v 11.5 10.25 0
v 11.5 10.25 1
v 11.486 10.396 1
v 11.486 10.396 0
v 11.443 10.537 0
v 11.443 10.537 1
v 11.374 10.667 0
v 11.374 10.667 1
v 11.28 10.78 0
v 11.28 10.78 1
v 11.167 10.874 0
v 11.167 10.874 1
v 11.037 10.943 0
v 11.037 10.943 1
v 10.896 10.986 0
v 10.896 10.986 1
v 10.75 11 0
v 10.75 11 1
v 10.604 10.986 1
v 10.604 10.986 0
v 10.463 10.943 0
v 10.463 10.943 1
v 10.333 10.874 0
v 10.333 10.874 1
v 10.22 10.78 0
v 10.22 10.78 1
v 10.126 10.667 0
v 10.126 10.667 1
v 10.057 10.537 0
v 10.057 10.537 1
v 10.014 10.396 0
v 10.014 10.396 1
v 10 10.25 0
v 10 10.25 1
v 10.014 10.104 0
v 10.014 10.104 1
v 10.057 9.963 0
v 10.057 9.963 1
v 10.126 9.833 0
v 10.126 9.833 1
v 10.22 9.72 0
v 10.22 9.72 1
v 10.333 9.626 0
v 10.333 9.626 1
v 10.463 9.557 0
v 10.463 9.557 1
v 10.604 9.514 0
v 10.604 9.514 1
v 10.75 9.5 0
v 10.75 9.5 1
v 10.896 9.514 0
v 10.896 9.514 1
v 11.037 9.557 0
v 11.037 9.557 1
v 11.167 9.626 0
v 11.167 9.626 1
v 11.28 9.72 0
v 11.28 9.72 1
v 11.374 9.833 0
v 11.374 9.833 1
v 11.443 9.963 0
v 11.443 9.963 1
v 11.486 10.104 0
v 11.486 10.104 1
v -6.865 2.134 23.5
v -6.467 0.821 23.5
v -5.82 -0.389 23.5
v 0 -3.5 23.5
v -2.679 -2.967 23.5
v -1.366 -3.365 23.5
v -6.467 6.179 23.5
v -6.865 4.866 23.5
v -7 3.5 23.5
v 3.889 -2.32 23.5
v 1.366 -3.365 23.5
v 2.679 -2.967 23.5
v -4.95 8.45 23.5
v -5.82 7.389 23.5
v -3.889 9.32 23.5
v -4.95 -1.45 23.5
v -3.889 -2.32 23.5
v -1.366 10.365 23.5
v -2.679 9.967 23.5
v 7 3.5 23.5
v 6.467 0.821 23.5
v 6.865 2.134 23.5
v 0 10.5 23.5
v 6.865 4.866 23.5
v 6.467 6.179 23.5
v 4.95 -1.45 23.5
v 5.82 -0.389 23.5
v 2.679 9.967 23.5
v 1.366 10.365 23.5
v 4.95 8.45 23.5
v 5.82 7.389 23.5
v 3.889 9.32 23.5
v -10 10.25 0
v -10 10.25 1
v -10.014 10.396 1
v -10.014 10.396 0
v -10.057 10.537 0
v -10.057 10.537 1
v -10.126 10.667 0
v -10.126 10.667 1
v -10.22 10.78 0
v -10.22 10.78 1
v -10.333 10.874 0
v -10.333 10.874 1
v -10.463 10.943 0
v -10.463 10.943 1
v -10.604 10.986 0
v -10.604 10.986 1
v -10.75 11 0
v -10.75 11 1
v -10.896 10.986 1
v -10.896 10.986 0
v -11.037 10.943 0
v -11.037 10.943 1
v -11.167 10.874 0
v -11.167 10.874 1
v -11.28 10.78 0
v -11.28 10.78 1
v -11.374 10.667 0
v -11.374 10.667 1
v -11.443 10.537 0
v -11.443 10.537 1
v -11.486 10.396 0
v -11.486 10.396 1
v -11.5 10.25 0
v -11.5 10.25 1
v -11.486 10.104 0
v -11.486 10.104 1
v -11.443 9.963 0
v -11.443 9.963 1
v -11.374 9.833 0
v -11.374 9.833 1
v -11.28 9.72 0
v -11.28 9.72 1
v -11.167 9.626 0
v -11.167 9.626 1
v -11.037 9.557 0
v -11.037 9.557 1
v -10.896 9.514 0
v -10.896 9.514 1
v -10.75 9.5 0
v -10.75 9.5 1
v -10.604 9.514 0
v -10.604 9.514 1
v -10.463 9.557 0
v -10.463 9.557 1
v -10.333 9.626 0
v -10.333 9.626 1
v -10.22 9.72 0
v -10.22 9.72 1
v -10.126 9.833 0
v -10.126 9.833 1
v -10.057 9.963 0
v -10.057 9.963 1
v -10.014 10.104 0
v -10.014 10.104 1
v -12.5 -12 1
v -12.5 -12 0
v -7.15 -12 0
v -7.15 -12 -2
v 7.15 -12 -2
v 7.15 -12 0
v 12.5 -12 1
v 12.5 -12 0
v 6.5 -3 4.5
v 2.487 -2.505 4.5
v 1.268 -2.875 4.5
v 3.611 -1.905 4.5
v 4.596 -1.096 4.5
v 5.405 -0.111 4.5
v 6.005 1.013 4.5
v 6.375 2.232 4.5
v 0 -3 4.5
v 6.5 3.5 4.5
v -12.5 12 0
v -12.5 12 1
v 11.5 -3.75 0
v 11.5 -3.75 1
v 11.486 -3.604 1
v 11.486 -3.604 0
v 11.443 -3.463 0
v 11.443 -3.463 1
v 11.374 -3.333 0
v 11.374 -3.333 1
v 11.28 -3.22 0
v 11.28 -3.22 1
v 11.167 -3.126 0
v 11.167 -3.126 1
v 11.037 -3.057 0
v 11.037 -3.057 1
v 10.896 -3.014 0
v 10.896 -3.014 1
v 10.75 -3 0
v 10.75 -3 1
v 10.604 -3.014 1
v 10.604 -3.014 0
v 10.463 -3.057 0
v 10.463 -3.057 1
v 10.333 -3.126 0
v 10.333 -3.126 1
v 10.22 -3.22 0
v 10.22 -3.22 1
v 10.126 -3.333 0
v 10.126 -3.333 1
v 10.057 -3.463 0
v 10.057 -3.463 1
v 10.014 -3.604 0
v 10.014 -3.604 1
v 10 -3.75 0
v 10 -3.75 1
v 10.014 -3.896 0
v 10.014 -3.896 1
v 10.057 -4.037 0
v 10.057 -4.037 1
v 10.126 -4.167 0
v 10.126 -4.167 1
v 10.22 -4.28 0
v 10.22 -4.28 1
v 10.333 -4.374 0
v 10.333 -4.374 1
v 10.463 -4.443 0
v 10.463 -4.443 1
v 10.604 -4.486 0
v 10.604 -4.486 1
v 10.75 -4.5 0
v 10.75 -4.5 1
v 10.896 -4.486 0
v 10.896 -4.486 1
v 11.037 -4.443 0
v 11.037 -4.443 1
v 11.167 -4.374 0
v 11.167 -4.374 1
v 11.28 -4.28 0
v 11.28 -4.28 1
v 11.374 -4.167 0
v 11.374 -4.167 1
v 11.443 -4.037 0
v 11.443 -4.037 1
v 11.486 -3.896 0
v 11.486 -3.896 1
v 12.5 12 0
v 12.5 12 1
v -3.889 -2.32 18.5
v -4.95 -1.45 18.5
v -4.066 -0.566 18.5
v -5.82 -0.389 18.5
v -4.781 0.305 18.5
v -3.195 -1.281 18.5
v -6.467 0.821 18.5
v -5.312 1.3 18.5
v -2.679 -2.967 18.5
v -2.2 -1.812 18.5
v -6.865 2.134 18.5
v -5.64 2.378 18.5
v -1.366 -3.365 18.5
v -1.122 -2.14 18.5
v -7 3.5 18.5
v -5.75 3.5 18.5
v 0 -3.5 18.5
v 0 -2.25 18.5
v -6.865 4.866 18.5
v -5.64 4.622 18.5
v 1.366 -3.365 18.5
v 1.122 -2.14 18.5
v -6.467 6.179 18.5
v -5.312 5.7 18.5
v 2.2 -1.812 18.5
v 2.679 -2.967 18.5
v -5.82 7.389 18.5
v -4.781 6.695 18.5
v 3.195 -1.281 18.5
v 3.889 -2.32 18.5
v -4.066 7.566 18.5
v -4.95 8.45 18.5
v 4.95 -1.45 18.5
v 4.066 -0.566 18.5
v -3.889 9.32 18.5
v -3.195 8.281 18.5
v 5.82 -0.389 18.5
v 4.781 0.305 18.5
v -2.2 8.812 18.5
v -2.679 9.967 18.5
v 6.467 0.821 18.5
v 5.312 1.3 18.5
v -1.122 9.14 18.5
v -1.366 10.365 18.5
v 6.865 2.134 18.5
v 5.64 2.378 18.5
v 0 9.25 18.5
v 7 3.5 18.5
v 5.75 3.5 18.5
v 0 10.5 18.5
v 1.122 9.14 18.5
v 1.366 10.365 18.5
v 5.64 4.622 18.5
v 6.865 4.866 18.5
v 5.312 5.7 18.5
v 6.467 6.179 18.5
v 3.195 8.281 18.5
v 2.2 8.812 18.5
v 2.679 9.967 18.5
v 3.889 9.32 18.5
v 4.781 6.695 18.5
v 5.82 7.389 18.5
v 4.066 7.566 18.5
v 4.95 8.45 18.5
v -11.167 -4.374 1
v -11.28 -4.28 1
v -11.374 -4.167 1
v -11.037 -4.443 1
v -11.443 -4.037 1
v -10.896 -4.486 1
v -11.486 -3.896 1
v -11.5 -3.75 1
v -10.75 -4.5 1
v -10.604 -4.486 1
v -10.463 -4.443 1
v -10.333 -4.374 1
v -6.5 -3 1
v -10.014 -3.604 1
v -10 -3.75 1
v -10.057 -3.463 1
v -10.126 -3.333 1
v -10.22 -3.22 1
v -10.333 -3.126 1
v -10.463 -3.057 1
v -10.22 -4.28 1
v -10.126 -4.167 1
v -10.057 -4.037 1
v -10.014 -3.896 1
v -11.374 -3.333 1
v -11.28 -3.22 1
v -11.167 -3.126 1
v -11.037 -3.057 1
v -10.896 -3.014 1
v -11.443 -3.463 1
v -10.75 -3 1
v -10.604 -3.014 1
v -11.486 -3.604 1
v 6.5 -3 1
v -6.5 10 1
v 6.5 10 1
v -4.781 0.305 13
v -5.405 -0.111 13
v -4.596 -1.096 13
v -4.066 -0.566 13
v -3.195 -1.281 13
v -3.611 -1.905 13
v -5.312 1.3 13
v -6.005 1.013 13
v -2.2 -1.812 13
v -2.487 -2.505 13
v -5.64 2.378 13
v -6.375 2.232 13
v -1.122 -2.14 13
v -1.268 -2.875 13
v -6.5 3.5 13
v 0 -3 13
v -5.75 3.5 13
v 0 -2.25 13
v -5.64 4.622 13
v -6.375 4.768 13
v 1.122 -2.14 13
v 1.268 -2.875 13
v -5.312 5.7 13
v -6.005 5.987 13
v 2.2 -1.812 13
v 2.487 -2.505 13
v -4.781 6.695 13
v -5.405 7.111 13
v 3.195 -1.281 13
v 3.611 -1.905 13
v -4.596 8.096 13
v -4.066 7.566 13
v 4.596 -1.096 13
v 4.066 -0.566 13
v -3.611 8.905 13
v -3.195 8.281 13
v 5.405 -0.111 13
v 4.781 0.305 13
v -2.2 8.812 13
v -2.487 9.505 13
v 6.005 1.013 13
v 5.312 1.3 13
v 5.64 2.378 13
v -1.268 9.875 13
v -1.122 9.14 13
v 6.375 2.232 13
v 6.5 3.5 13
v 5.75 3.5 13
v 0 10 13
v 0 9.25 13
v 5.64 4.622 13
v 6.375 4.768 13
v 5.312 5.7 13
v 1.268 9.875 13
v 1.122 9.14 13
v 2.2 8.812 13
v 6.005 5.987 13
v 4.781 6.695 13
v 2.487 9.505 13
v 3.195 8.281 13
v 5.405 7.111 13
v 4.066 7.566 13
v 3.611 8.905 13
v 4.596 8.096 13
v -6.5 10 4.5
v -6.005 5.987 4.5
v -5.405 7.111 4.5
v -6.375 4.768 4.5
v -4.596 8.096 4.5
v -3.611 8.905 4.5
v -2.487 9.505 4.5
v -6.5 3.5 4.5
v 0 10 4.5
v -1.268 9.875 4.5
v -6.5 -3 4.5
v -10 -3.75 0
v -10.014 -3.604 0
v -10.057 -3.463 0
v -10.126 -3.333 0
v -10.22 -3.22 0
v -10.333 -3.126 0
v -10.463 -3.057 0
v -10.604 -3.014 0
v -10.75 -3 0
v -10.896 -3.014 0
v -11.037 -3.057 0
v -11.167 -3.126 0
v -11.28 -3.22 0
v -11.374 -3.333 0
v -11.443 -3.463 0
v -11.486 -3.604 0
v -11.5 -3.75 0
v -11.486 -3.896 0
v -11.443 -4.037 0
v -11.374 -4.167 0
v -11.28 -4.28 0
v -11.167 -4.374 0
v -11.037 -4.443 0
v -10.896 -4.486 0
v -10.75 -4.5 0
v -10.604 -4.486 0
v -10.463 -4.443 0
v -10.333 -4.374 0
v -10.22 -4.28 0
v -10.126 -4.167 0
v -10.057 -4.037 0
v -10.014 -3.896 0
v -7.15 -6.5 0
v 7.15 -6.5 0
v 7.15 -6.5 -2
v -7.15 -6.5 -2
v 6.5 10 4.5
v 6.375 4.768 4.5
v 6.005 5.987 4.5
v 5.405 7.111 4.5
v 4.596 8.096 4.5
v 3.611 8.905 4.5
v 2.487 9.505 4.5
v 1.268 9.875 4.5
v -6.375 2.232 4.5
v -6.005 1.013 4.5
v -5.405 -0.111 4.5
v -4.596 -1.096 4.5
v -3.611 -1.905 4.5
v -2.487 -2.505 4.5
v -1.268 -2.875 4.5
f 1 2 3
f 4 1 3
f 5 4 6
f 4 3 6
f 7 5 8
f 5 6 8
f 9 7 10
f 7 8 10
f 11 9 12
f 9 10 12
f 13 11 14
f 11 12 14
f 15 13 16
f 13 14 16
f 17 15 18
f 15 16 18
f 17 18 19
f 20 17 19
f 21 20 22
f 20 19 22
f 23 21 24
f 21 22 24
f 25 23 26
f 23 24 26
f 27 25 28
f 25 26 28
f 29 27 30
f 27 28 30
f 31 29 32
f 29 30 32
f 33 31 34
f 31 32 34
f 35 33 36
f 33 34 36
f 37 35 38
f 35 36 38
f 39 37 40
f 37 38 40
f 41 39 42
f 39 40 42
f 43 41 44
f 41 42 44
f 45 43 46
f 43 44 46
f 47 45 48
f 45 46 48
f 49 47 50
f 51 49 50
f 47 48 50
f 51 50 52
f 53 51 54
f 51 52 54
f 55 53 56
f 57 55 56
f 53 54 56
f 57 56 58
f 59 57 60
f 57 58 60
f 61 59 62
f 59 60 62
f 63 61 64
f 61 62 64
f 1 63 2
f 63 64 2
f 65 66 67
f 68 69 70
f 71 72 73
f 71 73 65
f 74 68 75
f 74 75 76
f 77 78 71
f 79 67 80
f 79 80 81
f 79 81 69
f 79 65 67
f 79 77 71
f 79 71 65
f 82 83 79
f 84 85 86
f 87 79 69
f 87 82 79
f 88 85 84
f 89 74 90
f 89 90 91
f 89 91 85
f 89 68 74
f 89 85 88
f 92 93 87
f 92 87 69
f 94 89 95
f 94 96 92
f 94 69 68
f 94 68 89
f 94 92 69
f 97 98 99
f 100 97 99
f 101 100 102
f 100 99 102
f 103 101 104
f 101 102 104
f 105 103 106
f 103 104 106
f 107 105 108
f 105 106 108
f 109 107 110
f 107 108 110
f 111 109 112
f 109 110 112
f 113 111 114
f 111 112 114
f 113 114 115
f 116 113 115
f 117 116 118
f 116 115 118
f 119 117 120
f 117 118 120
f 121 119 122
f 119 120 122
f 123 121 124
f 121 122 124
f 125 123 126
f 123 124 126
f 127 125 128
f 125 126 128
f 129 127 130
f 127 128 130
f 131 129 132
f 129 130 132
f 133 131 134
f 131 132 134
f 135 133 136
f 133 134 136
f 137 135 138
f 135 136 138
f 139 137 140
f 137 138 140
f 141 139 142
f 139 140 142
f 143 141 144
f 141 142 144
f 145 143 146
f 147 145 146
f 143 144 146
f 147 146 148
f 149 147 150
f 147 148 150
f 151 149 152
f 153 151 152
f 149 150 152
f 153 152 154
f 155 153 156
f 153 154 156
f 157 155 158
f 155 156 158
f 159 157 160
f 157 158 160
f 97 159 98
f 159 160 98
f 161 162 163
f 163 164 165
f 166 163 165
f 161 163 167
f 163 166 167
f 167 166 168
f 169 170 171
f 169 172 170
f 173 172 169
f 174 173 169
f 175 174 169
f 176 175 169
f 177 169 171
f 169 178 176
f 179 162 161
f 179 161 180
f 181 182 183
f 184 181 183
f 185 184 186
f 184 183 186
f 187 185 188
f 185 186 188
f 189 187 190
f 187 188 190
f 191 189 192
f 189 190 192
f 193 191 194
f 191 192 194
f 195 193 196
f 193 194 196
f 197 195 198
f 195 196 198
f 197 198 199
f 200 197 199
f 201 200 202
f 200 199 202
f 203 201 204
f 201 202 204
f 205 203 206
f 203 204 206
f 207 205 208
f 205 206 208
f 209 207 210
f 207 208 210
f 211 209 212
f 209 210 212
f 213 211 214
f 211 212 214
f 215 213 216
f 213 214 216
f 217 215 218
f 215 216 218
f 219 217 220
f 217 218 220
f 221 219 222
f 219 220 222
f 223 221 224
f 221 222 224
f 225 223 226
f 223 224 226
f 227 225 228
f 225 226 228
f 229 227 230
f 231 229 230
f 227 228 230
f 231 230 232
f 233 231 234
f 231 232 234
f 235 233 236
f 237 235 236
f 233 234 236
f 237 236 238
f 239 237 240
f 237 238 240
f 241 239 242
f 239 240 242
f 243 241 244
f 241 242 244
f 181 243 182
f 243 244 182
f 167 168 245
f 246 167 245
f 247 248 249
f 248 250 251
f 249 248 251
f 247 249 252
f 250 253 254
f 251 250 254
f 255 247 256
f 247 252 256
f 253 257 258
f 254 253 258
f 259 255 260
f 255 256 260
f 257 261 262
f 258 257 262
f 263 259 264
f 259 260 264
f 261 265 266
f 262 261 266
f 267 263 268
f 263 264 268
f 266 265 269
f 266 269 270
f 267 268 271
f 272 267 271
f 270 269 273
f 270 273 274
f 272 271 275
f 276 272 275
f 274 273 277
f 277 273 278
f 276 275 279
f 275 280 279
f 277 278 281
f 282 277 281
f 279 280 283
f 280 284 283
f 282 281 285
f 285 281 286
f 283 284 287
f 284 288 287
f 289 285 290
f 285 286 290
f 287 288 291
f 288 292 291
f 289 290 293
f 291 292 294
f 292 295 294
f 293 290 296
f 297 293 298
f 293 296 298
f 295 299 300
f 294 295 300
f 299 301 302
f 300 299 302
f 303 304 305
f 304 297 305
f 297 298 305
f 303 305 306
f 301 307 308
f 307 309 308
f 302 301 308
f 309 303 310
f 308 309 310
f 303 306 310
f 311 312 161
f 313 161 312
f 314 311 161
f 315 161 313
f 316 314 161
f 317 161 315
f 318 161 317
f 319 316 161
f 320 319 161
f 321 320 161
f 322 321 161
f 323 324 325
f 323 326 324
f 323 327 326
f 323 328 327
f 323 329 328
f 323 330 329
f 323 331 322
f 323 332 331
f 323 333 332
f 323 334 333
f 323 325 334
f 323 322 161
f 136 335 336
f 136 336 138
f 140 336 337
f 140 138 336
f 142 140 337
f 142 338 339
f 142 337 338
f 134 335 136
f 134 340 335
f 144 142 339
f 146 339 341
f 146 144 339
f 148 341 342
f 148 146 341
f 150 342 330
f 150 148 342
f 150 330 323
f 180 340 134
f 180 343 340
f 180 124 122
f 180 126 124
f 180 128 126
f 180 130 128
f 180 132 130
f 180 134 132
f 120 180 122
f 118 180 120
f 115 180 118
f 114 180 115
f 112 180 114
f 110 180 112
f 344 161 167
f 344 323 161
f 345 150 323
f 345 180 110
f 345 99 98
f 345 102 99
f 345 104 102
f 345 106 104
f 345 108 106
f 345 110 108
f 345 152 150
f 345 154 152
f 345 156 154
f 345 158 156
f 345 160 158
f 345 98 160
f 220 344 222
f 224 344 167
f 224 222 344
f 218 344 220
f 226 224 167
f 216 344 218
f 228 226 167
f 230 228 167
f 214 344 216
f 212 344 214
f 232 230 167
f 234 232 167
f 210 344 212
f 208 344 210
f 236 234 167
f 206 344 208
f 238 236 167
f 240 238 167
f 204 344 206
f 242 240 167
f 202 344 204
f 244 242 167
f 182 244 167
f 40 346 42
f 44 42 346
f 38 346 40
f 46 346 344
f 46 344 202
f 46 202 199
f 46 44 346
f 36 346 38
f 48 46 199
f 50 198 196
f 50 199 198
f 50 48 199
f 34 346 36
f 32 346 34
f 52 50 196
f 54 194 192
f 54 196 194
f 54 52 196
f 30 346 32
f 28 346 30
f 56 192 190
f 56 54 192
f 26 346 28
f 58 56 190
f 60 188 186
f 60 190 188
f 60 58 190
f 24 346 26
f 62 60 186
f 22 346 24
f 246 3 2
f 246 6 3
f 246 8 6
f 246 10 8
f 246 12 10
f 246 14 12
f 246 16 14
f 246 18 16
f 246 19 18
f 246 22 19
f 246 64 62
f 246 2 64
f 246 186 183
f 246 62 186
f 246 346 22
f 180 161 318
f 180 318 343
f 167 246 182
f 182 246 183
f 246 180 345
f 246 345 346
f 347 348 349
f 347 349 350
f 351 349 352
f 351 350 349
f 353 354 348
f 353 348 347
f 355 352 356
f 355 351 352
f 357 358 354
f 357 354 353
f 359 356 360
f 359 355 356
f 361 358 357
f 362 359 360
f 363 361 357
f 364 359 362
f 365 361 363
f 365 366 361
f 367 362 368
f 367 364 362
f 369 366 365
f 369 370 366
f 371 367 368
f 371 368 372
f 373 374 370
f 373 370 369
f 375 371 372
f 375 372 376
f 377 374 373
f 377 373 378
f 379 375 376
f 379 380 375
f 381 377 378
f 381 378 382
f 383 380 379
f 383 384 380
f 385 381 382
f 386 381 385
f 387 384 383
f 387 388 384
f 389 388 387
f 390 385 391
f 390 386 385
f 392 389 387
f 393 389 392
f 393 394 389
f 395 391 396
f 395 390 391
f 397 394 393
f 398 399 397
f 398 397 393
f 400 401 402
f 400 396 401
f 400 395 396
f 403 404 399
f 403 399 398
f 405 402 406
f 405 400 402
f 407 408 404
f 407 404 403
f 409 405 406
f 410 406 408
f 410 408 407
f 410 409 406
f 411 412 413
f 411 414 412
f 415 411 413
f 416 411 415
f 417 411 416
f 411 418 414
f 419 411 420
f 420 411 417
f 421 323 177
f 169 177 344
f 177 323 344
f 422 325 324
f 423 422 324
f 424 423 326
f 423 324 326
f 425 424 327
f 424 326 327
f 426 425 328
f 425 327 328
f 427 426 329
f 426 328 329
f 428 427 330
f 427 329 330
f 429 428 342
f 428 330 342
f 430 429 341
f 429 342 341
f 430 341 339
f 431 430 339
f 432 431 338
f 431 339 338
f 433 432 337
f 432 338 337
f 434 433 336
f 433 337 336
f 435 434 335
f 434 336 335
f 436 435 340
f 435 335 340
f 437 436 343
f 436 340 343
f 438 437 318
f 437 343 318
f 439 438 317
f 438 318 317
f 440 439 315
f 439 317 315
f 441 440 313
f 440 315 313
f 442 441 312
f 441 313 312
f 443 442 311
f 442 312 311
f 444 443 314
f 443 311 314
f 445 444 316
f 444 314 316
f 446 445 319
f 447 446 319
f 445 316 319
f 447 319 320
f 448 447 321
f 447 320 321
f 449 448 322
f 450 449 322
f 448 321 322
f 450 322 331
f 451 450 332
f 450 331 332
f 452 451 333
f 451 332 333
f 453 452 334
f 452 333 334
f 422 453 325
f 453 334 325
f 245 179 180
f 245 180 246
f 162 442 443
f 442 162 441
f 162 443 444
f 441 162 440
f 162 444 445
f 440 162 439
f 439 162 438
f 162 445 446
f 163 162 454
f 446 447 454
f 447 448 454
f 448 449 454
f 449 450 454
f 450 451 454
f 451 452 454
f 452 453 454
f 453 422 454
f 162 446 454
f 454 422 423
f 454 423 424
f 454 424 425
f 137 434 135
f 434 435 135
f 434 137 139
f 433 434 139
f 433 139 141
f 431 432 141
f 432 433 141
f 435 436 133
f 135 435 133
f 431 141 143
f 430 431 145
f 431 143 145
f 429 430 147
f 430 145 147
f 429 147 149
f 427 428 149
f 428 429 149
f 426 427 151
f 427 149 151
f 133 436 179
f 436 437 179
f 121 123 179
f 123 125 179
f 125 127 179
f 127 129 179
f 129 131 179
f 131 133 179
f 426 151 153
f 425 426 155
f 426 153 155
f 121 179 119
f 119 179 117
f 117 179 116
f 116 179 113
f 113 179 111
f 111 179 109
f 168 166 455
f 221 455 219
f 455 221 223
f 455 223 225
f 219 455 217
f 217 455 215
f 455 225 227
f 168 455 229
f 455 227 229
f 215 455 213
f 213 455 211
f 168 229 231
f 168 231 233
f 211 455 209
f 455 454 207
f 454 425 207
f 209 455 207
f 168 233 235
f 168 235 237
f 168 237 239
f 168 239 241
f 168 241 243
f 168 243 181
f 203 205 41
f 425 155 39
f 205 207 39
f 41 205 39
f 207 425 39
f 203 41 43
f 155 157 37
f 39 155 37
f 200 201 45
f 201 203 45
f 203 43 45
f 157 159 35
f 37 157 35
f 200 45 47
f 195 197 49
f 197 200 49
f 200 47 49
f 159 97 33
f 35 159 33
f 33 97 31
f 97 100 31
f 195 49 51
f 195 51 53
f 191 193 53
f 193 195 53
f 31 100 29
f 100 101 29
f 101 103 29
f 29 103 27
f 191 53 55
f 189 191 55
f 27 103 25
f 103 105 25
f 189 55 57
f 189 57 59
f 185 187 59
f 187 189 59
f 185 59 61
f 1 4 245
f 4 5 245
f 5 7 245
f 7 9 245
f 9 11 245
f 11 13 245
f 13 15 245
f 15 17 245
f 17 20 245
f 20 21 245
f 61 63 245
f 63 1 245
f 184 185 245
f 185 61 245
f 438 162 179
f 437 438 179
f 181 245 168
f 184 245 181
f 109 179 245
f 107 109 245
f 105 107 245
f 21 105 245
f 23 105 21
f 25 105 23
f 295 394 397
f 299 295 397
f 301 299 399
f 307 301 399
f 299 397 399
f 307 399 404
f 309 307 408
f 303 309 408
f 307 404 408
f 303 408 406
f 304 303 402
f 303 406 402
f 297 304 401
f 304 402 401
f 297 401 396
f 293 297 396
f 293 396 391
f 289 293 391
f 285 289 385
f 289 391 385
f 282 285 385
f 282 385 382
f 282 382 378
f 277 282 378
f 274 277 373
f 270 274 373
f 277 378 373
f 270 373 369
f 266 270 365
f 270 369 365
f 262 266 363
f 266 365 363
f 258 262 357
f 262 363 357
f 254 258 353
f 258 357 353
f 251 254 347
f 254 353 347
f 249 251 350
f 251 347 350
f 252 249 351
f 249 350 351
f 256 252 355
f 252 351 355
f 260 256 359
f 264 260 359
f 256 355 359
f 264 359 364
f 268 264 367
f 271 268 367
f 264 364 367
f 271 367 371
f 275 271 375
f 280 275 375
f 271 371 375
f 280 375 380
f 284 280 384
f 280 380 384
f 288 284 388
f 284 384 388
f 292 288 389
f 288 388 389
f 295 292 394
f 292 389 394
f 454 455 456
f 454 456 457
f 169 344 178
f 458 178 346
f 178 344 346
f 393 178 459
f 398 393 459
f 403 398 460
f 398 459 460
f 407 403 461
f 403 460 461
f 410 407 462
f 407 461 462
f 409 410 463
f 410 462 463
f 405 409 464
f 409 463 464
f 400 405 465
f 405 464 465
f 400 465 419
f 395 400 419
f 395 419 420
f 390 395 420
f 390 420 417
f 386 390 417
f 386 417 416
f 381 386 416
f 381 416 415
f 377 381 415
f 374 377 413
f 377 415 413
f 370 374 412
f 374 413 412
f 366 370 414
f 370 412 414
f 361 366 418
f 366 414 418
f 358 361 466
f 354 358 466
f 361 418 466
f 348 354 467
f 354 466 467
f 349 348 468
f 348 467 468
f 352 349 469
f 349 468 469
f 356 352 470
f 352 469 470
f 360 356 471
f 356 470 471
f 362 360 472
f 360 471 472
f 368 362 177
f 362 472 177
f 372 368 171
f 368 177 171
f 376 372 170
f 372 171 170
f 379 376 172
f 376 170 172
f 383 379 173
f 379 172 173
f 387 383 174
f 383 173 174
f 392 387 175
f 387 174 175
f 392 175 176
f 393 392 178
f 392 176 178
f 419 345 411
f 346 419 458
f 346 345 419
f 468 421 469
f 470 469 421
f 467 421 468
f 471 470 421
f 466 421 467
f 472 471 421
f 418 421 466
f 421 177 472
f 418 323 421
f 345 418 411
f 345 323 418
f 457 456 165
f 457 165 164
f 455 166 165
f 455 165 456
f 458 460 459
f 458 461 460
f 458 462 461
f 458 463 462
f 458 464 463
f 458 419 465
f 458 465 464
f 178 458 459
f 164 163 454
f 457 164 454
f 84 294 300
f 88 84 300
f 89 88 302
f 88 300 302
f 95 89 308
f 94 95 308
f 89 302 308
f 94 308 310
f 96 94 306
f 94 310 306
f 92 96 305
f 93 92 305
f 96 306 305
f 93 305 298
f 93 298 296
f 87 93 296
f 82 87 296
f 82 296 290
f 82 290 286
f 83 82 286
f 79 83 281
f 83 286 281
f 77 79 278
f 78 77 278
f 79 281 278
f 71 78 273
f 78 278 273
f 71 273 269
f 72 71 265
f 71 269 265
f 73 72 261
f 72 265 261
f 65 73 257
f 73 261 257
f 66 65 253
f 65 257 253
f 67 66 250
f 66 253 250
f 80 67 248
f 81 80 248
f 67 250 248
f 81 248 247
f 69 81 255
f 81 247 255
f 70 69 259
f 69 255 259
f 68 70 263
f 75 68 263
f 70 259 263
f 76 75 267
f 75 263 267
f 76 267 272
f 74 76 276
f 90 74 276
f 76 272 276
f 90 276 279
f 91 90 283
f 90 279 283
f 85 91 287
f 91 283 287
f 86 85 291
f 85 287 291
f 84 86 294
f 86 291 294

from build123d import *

# Parameters (mm, degrees)
SKETCH_1_W          = 25
SKETCH_1_H          = 24
EXTRUDE_1_DEPTH     = 1
SKETCH_2_W          = 13
SKETCH_2_H          = 13
EXTRUDE_2_DEPTH     = 3.5
SKETCH_3_R          = 6.5
EXTRUDE_3_DEPTH     = 8.5
SKETCH_4_R          = 5.75
EXTRUDE_4_DEPTH     = 5.5
SKETCH_5_R          = 7
EXTRUDE_5_DEPTH     = 5
SKETCH_6_R          = 0.75
CUT_EXTRUDE_1_DEPTH = 1
SKETCH_7_W          = 14.3
SKETCH_7_H          = 5.5
EXTRUDE_6_DEPTH     = 2


with BuildPart() as part:
    # 草图1 → 凸台-拉伸1 (new body)
    with BuildSketch(Plane.XY):
        Rectangle(SKETCH_1_W, SKETCH_1_H)
    extrude(amount=EXTRUDE_1_DEPTH)

    # 草图2 → 凸台-拉伸2 (add)
    with BuildSketch(Plane.XY.offset(1)):
        with Locations((0, 3.5)):
            Rectangle(SKETCH_2_W, SKETCH_2_H)
    extrude(amount=EXTRUDE_2_DEPTH)

    # 草图3 → 凸台-拉伸3 (add)
    with BuildSketch(Plane.XY.offset(4.5)):
        with Locations((0, 3.5)):
            Circle(SKETCH_3_R)
    extrude(amount=EXTRUDE_3_DEPTH)

    # 草图4 → 凸台-拉伸4 (add)
    with BuildSketch(Plane.XY.offset(13)):
        with Locations((0, 3.5)):
            Circle(SKETCH_4_R)
    extrude(amount=EXTRUDE_4_DEPTH)

    # 草图5 → 凸台-拉伸5 (add)
    with BuildSketch(Plane.XY.offset(18.5)):
        with Locations((0, 3.5)):
            Circle(SKETCH_5_R)
    extrude(amount=EXTRUDE_5_DEPTH)

    # 草图6 → 切除-拉伸1 (cut)
    with BuildSketch(Plane.XY.offset(1)):
        with Locations((10.75, 10.25)):
            Circle(SKETCH_6_R)
        with Locations((10.75, -3.75)):
            Circle(SKETCH_6_R)
        with Locations((-10.75, 10.25)):
            Circle(SKETCH_6_R)
        with Locations((-10.75, -3.75)):
            Circle(SKETCH_6_R)
    extrude(amount=-CUT_EXTRUDE_1_DEPTH, mode=Mode.SUBTRACT)

    # 草图7 → 凸台-拉伸6 (add)
    with BuildSketch(Plane(origin=(0, 0, 0), x_dir=(-1, 0, 0), z_dir=(0, 0, -1))):
        with Locations((0, -9.25)):
            Rectangle(SKETCH_7_W, SKETCH_7_H)
    extrude(amount=EXTRUDE_6_DEPTH)


solid = part.part
